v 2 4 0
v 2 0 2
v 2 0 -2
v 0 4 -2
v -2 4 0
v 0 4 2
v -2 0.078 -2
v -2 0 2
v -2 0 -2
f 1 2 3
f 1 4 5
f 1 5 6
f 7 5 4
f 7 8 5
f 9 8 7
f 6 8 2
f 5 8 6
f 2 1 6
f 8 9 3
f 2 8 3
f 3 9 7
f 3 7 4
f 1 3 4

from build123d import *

# Parameters (mm, degrees)
SKETCH1_W           = 4
SKETCH1_H           = 4
BOSS_EXTRUDE1_DEPTH = 4
CUT_EXTRUDE1_DEPTH  = 4
CUT_EXTRUDE3_DEPTH  = 4
CUT_EXTRUDE5_DEPTH  = 4
CUT_EXTRUDE6_DEPTH  = 4


with BuildPart() as part:
    # Sketch1 → Boss-Extrude1 (new body)
    with BuildSketch(Plane(origin=(0, 0, 0), x_dir=(1, 0, 0), z_dir=(0, 1, 0))):
        Rectangle(SKETCH1_W, SKETCH1_H)
    extrude(amount=BOSS_EXTRUDE1_DEPTH)

    # 3DSketch1 → Cut-Extrude1 (cut, along a direction that is not the sketch's normal)
    with BuildSketch(Plane(origin=(-2, 0, 2), x_dir=(0.447213595499958, 0.894427190999916, 0), z_dir=(-0.6666666666666667, 0.33333333333333337, 0.6666666666666667))):
        Polygon((0, 0), (4.472135955, 0), (3.577708764, 2.683281573), align=None)
    extrude(amount=CUT_EXTRUDE1_DEPTH, dir=(-1, 0, 0), mode=Mode.SUBTRACT)

    # 3DSketch2 → Cut-Extrude3 (cut, along a direction that is not the sketch's normal)
    with BuildSketch(Plane(origin=(0, 4, 2), x_dir=(0.447213595499958, -0.894427190999916, 0), z_dir=(0.6666666666666667, 0.33333333333333337, 0.6666666666666667))):
        Polygon((0, 0), (4.472135955, 0), (0.894427191, 2.683281573), align=None)
    extrude(amount=CUT_EXTRUDE3_DEPTH, dir=(1, 0, 0), mode=Mode.SUBTRACT)

    # 3DSketch3 → Cut-Extrude5 (cut, along a direction that is not the sketch's normal)
    with BuildSketch(Plane(origin=(2, 0, -2), x_dir=(0, 0.894427190999916, 0.4472135954999579), z_dir=(-0.6666666666666666, -0.3333333333333333, 0.6666666666666667))):
        Polygon((0, 0), (4.472135955, 0), (3.577708764, 2.683281573), align=None)
    extrude(amount=-CUT_EXTRUDE5_DEPTH, dir=(0, 0, 1), mode=Mode.SUBTRACT)

    # 3DSketch4 → Cut-Extrude6 (cut, along a direction that is not the sketch's normal)
    with BuildSketch(Plane(origin=(0, 4, -2), x_dir=(-0.45428866888855013, -0.8908545365655772, 0), z_dir=(-0.6651833322407542, 0.3392082973899275, -0.6651833322407539))):
        Polygon((0, 0), (4.40248709, 0), (0.908577338, 2.678523328), align=None)
    extrude(amount=CUT_EXTRUDE6_DEPTH, dir=(-1, 0, 0), mode=Mode.SUBTRACT)


solid = part.part
